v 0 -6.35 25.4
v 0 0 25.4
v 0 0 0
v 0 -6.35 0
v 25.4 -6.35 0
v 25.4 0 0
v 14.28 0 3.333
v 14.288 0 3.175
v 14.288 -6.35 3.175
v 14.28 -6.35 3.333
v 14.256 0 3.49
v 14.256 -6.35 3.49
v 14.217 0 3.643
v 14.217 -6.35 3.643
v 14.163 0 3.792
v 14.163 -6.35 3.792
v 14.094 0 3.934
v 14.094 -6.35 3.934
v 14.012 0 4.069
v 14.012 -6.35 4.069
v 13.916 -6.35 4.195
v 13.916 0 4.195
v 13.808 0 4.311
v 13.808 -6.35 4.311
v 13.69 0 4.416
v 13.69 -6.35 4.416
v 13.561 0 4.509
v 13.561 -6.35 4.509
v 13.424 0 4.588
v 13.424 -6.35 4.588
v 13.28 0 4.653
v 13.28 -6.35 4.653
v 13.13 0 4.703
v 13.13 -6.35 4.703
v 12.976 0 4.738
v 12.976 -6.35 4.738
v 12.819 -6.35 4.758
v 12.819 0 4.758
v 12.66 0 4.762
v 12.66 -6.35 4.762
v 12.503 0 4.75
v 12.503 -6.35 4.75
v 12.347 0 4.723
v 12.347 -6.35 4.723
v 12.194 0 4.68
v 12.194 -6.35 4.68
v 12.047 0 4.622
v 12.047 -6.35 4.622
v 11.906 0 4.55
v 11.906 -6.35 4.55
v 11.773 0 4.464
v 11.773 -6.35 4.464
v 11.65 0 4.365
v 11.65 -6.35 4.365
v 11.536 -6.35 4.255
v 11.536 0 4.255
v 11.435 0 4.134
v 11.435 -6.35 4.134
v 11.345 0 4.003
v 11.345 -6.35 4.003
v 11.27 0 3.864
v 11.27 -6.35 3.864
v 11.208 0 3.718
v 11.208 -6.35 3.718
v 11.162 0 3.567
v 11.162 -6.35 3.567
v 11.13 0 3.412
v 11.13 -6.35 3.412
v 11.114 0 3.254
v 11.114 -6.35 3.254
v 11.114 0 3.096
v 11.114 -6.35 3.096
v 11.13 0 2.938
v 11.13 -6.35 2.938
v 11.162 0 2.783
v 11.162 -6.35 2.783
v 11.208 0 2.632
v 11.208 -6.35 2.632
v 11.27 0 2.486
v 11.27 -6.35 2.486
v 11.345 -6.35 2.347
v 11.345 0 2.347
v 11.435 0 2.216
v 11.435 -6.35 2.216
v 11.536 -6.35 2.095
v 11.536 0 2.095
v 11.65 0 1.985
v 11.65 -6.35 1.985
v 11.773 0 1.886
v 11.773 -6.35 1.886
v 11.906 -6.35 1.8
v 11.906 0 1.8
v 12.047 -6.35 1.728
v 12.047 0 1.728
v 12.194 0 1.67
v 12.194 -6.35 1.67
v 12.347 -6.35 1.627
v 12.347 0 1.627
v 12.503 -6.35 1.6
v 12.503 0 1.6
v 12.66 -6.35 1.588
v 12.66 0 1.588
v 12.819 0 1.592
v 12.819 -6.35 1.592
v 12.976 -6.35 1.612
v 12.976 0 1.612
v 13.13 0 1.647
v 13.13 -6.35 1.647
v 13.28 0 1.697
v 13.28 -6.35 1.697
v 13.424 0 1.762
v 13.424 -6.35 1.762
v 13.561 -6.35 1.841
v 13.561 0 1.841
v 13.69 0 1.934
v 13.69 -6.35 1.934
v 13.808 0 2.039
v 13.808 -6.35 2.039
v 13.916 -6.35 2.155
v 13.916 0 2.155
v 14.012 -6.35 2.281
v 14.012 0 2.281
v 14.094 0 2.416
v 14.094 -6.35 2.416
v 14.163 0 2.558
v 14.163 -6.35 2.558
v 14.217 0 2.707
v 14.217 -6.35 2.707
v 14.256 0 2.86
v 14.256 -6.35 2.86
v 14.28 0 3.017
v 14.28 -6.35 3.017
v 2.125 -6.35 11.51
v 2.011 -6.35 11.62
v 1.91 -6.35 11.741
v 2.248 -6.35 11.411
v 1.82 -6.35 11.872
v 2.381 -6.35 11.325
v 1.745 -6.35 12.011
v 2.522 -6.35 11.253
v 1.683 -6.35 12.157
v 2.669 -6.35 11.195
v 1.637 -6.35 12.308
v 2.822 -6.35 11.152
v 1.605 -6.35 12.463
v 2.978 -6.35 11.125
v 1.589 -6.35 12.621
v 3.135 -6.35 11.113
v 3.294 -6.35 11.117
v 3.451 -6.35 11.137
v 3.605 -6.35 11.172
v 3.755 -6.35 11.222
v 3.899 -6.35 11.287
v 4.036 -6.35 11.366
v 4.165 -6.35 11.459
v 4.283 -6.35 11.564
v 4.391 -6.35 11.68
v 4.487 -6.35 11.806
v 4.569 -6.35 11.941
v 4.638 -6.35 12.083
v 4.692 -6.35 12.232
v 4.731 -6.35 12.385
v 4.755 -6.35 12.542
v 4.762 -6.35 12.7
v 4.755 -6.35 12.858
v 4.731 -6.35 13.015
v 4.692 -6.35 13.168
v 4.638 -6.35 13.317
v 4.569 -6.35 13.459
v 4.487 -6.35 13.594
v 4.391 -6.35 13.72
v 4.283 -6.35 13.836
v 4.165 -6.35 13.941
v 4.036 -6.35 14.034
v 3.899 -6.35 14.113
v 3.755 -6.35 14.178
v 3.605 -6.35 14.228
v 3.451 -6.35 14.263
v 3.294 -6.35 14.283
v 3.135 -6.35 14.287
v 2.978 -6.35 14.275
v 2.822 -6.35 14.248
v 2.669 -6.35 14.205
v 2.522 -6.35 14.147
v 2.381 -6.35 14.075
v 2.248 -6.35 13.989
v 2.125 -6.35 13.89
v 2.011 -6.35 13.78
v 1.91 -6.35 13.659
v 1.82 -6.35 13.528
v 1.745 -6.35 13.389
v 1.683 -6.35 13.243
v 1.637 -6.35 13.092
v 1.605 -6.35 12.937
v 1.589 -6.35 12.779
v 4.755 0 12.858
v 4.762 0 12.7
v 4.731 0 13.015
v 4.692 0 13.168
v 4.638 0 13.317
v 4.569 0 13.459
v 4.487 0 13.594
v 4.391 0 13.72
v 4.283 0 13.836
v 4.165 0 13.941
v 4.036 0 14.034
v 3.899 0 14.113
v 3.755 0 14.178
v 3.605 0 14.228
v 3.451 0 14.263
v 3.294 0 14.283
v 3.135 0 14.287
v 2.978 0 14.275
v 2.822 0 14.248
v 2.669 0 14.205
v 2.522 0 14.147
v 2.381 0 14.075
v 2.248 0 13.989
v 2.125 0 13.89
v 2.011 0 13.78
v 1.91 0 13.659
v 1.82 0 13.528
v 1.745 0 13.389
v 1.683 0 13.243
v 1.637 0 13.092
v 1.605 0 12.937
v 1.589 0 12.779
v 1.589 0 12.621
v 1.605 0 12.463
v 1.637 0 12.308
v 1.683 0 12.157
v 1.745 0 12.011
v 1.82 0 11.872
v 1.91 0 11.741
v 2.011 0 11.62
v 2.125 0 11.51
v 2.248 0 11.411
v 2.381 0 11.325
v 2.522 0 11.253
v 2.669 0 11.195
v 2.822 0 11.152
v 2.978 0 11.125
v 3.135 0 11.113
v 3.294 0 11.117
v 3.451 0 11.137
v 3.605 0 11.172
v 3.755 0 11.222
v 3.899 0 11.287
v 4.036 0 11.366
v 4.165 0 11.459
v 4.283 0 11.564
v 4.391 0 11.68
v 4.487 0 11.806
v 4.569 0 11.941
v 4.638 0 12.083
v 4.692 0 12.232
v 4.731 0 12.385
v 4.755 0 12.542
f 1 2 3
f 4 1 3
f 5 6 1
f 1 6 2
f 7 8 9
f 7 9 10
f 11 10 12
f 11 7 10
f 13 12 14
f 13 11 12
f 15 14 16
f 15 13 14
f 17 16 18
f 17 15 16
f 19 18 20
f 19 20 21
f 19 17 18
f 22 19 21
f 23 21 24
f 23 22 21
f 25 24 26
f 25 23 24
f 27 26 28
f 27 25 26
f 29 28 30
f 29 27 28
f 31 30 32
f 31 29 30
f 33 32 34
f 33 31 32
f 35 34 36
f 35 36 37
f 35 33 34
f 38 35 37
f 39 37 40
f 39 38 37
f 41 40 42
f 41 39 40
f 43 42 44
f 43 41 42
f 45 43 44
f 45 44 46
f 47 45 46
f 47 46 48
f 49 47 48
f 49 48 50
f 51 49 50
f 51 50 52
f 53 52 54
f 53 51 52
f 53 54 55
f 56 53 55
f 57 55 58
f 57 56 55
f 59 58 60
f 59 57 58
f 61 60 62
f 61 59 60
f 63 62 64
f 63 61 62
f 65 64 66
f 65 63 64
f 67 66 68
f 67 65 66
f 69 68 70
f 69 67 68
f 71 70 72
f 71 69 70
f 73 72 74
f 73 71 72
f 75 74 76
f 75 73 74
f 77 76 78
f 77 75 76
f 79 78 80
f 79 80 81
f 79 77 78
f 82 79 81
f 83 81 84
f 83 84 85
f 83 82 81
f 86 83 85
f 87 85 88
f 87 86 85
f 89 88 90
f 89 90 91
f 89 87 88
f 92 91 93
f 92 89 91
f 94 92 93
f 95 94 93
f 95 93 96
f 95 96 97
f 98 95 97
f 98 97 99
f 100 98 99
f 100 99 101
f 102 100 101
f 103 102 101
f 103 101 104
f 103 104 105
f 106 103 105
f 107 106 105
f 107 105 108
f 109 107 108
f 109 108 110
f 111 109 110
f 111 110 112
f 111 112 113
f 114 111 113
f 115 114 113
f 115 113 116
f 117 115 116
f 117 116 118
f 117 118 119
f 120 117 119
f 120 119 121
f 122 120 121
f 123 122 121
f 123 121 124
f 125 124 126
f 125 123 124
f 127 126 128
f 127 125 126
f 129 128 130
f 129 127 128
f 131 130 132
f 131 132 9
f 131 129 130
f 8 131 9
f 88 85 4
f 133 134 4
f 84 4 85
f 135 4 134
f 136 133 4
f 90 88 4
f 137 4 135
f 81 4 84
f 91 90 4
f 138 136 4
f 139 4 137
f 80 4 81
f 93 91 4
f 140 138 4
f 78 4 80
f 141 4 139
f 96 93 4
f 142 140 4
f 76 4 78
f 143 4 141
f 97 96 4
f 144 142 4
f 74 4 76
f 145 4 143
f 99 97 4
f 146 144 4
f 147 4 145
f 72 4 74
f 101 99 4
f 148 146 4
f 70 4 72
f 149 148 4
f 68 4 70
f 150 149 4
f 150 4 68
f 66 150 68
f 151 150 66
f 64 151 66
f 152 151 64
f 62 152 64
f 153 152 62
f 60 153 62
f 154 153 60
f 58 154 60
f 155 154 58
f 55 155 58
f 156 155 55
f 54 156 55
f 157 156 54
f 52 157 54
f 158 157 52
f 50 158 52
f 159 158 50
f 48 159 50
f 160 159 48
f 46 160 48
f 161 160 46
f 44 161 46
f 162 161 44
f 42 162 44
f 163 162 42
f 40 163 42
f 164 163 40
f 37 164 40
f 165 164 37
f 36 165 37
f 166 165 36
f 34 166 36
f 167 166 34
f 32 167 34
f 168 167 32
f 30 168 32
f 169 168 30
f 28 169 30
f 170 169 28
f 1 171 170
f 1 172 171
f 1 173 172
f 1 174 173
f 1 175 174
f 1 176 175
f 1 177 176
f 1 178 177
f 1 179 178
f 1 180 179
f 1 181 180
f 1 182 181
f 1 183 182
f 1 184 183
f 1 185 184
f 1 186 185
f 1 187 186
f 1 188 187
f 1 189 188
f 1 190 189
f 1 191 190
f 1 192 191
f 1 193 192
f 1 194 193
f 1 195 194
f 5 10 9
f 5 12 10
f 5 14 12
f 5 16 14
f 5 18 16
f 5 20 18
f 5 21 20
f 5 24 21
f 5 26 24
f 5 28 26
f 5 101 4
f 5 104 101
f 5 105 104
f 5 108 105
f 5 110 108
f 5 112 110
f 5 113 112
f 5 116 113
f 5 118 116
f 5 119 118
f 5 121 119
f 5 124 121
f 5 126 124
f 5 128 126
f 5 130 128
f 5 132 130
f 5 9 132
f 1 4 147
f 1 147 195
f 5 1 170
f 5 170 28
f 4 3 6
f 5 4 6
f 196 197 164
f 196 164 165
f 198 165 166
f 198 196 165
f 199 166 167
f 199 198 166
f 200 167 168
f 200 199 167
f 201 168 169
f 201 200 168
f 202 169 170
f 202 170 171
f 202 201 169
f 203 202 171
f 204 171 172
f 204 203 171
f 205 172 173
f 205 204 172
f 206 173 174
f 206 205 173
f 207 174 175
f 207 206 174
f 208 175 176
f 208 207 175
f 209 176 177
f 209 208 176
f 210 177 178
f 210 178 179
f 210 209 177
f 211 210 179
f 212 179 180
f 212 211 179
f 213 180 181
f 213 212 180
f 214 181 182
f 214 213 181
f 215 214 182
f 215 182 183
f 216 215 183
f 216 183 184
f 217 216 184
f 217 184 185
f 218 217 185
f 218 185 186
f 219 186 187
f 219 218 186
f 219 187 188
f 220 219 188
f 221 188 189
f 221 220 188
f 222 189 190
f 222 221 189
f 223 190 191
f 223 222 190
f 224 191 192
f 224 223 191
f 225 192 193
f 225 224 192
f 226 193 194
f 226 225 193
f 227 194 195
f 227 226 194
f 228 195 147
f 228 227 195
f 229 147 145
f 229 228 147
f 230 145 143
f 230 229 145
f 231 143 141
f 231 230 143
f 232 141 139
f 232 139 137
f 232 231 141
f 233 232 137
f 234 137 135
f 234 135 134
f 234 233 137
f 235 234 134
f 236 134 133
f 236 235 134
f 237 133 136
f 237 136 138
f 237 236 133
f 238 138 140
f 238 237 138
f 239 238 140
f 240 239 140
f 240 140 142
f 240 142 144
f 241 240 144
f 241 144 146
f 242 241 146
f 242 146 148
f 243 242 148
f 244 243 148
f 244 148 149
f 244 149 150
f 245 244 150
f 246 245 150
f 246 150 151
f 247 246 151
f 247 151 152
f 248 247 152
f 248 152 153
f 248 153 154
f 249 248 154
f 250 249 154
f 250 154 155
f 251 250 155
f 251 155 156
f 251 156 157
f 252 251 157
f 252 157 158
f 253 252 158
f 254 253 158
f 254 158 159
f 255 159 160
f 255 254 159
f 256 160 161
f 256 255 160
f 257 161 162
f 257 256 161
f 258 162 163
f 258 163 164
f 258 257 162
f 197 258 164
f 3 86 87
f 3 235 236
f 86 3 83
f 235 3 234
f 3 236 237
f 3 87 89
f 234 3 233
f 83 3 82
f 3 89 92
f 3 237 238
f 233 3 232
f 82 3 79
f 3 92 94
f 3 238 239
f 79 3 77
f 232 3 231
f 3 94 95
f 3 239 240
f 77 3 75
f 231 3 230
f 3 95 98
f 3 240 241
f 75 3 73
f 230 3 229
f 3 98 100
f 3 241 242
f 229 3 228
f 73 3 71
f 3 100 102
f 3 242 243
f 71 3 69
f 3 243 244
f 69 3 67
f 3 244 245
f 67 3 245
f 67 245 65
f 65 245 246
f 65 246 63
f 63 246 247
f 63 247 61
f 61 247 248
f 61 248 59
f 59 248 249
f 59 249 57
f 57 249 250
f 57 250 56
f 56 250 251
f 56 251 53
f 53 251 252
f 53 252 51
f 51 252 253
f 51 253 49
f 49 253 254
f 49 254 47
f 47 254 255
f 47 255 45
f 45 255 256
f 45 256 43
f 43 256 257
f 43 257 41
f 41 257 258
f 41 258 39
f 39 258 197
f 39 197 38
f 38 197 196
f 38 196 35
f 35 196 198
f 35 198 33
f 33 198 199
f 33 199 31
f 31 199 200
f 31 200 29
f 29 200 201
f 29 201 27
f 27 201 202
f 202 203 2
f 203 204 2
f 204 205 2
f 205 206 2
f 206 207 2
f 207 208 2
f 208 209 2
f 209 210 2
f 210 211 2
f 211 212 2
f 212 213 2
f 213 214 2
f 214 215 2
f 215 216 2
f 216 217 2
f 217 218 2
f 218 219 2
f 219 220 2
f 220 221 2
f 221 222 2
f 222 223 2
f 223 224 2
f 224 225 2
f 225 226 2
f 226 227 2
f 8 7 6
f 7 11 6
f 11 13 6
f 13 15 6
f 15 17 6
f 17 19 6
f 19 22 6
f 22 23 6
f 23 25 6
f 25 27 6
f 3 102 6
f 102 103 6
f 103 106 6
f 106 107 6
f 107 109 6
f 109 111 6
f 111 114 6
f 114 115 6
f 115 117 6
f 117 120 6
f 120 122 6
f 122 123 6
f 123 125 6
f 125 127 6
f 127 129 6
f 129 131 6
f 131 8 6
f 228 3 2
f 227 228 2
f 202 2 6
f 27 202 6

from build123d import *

# Parameters (mm, degrees)
F0_R     = 1.5875
F1_DEPTH = 6.35


with BuildPart() as f1:
    # F0 (on Front) → F1 (new body)
    with BuildSketch(Plane.XZ):
        Polygon((0, 25.4), (0, 0), (25.4, 0), align=None)
        with Locations((12.7, 3.175)):
            Circle(F0_R, mode=Mode.SUBTRACT)
        with Locations((3.175, 12.7)):
            Circle(F0_R, mode=Mode.SUBTRACT)
    extrude(amount=F1_DEPTH)


solid = f1.part
